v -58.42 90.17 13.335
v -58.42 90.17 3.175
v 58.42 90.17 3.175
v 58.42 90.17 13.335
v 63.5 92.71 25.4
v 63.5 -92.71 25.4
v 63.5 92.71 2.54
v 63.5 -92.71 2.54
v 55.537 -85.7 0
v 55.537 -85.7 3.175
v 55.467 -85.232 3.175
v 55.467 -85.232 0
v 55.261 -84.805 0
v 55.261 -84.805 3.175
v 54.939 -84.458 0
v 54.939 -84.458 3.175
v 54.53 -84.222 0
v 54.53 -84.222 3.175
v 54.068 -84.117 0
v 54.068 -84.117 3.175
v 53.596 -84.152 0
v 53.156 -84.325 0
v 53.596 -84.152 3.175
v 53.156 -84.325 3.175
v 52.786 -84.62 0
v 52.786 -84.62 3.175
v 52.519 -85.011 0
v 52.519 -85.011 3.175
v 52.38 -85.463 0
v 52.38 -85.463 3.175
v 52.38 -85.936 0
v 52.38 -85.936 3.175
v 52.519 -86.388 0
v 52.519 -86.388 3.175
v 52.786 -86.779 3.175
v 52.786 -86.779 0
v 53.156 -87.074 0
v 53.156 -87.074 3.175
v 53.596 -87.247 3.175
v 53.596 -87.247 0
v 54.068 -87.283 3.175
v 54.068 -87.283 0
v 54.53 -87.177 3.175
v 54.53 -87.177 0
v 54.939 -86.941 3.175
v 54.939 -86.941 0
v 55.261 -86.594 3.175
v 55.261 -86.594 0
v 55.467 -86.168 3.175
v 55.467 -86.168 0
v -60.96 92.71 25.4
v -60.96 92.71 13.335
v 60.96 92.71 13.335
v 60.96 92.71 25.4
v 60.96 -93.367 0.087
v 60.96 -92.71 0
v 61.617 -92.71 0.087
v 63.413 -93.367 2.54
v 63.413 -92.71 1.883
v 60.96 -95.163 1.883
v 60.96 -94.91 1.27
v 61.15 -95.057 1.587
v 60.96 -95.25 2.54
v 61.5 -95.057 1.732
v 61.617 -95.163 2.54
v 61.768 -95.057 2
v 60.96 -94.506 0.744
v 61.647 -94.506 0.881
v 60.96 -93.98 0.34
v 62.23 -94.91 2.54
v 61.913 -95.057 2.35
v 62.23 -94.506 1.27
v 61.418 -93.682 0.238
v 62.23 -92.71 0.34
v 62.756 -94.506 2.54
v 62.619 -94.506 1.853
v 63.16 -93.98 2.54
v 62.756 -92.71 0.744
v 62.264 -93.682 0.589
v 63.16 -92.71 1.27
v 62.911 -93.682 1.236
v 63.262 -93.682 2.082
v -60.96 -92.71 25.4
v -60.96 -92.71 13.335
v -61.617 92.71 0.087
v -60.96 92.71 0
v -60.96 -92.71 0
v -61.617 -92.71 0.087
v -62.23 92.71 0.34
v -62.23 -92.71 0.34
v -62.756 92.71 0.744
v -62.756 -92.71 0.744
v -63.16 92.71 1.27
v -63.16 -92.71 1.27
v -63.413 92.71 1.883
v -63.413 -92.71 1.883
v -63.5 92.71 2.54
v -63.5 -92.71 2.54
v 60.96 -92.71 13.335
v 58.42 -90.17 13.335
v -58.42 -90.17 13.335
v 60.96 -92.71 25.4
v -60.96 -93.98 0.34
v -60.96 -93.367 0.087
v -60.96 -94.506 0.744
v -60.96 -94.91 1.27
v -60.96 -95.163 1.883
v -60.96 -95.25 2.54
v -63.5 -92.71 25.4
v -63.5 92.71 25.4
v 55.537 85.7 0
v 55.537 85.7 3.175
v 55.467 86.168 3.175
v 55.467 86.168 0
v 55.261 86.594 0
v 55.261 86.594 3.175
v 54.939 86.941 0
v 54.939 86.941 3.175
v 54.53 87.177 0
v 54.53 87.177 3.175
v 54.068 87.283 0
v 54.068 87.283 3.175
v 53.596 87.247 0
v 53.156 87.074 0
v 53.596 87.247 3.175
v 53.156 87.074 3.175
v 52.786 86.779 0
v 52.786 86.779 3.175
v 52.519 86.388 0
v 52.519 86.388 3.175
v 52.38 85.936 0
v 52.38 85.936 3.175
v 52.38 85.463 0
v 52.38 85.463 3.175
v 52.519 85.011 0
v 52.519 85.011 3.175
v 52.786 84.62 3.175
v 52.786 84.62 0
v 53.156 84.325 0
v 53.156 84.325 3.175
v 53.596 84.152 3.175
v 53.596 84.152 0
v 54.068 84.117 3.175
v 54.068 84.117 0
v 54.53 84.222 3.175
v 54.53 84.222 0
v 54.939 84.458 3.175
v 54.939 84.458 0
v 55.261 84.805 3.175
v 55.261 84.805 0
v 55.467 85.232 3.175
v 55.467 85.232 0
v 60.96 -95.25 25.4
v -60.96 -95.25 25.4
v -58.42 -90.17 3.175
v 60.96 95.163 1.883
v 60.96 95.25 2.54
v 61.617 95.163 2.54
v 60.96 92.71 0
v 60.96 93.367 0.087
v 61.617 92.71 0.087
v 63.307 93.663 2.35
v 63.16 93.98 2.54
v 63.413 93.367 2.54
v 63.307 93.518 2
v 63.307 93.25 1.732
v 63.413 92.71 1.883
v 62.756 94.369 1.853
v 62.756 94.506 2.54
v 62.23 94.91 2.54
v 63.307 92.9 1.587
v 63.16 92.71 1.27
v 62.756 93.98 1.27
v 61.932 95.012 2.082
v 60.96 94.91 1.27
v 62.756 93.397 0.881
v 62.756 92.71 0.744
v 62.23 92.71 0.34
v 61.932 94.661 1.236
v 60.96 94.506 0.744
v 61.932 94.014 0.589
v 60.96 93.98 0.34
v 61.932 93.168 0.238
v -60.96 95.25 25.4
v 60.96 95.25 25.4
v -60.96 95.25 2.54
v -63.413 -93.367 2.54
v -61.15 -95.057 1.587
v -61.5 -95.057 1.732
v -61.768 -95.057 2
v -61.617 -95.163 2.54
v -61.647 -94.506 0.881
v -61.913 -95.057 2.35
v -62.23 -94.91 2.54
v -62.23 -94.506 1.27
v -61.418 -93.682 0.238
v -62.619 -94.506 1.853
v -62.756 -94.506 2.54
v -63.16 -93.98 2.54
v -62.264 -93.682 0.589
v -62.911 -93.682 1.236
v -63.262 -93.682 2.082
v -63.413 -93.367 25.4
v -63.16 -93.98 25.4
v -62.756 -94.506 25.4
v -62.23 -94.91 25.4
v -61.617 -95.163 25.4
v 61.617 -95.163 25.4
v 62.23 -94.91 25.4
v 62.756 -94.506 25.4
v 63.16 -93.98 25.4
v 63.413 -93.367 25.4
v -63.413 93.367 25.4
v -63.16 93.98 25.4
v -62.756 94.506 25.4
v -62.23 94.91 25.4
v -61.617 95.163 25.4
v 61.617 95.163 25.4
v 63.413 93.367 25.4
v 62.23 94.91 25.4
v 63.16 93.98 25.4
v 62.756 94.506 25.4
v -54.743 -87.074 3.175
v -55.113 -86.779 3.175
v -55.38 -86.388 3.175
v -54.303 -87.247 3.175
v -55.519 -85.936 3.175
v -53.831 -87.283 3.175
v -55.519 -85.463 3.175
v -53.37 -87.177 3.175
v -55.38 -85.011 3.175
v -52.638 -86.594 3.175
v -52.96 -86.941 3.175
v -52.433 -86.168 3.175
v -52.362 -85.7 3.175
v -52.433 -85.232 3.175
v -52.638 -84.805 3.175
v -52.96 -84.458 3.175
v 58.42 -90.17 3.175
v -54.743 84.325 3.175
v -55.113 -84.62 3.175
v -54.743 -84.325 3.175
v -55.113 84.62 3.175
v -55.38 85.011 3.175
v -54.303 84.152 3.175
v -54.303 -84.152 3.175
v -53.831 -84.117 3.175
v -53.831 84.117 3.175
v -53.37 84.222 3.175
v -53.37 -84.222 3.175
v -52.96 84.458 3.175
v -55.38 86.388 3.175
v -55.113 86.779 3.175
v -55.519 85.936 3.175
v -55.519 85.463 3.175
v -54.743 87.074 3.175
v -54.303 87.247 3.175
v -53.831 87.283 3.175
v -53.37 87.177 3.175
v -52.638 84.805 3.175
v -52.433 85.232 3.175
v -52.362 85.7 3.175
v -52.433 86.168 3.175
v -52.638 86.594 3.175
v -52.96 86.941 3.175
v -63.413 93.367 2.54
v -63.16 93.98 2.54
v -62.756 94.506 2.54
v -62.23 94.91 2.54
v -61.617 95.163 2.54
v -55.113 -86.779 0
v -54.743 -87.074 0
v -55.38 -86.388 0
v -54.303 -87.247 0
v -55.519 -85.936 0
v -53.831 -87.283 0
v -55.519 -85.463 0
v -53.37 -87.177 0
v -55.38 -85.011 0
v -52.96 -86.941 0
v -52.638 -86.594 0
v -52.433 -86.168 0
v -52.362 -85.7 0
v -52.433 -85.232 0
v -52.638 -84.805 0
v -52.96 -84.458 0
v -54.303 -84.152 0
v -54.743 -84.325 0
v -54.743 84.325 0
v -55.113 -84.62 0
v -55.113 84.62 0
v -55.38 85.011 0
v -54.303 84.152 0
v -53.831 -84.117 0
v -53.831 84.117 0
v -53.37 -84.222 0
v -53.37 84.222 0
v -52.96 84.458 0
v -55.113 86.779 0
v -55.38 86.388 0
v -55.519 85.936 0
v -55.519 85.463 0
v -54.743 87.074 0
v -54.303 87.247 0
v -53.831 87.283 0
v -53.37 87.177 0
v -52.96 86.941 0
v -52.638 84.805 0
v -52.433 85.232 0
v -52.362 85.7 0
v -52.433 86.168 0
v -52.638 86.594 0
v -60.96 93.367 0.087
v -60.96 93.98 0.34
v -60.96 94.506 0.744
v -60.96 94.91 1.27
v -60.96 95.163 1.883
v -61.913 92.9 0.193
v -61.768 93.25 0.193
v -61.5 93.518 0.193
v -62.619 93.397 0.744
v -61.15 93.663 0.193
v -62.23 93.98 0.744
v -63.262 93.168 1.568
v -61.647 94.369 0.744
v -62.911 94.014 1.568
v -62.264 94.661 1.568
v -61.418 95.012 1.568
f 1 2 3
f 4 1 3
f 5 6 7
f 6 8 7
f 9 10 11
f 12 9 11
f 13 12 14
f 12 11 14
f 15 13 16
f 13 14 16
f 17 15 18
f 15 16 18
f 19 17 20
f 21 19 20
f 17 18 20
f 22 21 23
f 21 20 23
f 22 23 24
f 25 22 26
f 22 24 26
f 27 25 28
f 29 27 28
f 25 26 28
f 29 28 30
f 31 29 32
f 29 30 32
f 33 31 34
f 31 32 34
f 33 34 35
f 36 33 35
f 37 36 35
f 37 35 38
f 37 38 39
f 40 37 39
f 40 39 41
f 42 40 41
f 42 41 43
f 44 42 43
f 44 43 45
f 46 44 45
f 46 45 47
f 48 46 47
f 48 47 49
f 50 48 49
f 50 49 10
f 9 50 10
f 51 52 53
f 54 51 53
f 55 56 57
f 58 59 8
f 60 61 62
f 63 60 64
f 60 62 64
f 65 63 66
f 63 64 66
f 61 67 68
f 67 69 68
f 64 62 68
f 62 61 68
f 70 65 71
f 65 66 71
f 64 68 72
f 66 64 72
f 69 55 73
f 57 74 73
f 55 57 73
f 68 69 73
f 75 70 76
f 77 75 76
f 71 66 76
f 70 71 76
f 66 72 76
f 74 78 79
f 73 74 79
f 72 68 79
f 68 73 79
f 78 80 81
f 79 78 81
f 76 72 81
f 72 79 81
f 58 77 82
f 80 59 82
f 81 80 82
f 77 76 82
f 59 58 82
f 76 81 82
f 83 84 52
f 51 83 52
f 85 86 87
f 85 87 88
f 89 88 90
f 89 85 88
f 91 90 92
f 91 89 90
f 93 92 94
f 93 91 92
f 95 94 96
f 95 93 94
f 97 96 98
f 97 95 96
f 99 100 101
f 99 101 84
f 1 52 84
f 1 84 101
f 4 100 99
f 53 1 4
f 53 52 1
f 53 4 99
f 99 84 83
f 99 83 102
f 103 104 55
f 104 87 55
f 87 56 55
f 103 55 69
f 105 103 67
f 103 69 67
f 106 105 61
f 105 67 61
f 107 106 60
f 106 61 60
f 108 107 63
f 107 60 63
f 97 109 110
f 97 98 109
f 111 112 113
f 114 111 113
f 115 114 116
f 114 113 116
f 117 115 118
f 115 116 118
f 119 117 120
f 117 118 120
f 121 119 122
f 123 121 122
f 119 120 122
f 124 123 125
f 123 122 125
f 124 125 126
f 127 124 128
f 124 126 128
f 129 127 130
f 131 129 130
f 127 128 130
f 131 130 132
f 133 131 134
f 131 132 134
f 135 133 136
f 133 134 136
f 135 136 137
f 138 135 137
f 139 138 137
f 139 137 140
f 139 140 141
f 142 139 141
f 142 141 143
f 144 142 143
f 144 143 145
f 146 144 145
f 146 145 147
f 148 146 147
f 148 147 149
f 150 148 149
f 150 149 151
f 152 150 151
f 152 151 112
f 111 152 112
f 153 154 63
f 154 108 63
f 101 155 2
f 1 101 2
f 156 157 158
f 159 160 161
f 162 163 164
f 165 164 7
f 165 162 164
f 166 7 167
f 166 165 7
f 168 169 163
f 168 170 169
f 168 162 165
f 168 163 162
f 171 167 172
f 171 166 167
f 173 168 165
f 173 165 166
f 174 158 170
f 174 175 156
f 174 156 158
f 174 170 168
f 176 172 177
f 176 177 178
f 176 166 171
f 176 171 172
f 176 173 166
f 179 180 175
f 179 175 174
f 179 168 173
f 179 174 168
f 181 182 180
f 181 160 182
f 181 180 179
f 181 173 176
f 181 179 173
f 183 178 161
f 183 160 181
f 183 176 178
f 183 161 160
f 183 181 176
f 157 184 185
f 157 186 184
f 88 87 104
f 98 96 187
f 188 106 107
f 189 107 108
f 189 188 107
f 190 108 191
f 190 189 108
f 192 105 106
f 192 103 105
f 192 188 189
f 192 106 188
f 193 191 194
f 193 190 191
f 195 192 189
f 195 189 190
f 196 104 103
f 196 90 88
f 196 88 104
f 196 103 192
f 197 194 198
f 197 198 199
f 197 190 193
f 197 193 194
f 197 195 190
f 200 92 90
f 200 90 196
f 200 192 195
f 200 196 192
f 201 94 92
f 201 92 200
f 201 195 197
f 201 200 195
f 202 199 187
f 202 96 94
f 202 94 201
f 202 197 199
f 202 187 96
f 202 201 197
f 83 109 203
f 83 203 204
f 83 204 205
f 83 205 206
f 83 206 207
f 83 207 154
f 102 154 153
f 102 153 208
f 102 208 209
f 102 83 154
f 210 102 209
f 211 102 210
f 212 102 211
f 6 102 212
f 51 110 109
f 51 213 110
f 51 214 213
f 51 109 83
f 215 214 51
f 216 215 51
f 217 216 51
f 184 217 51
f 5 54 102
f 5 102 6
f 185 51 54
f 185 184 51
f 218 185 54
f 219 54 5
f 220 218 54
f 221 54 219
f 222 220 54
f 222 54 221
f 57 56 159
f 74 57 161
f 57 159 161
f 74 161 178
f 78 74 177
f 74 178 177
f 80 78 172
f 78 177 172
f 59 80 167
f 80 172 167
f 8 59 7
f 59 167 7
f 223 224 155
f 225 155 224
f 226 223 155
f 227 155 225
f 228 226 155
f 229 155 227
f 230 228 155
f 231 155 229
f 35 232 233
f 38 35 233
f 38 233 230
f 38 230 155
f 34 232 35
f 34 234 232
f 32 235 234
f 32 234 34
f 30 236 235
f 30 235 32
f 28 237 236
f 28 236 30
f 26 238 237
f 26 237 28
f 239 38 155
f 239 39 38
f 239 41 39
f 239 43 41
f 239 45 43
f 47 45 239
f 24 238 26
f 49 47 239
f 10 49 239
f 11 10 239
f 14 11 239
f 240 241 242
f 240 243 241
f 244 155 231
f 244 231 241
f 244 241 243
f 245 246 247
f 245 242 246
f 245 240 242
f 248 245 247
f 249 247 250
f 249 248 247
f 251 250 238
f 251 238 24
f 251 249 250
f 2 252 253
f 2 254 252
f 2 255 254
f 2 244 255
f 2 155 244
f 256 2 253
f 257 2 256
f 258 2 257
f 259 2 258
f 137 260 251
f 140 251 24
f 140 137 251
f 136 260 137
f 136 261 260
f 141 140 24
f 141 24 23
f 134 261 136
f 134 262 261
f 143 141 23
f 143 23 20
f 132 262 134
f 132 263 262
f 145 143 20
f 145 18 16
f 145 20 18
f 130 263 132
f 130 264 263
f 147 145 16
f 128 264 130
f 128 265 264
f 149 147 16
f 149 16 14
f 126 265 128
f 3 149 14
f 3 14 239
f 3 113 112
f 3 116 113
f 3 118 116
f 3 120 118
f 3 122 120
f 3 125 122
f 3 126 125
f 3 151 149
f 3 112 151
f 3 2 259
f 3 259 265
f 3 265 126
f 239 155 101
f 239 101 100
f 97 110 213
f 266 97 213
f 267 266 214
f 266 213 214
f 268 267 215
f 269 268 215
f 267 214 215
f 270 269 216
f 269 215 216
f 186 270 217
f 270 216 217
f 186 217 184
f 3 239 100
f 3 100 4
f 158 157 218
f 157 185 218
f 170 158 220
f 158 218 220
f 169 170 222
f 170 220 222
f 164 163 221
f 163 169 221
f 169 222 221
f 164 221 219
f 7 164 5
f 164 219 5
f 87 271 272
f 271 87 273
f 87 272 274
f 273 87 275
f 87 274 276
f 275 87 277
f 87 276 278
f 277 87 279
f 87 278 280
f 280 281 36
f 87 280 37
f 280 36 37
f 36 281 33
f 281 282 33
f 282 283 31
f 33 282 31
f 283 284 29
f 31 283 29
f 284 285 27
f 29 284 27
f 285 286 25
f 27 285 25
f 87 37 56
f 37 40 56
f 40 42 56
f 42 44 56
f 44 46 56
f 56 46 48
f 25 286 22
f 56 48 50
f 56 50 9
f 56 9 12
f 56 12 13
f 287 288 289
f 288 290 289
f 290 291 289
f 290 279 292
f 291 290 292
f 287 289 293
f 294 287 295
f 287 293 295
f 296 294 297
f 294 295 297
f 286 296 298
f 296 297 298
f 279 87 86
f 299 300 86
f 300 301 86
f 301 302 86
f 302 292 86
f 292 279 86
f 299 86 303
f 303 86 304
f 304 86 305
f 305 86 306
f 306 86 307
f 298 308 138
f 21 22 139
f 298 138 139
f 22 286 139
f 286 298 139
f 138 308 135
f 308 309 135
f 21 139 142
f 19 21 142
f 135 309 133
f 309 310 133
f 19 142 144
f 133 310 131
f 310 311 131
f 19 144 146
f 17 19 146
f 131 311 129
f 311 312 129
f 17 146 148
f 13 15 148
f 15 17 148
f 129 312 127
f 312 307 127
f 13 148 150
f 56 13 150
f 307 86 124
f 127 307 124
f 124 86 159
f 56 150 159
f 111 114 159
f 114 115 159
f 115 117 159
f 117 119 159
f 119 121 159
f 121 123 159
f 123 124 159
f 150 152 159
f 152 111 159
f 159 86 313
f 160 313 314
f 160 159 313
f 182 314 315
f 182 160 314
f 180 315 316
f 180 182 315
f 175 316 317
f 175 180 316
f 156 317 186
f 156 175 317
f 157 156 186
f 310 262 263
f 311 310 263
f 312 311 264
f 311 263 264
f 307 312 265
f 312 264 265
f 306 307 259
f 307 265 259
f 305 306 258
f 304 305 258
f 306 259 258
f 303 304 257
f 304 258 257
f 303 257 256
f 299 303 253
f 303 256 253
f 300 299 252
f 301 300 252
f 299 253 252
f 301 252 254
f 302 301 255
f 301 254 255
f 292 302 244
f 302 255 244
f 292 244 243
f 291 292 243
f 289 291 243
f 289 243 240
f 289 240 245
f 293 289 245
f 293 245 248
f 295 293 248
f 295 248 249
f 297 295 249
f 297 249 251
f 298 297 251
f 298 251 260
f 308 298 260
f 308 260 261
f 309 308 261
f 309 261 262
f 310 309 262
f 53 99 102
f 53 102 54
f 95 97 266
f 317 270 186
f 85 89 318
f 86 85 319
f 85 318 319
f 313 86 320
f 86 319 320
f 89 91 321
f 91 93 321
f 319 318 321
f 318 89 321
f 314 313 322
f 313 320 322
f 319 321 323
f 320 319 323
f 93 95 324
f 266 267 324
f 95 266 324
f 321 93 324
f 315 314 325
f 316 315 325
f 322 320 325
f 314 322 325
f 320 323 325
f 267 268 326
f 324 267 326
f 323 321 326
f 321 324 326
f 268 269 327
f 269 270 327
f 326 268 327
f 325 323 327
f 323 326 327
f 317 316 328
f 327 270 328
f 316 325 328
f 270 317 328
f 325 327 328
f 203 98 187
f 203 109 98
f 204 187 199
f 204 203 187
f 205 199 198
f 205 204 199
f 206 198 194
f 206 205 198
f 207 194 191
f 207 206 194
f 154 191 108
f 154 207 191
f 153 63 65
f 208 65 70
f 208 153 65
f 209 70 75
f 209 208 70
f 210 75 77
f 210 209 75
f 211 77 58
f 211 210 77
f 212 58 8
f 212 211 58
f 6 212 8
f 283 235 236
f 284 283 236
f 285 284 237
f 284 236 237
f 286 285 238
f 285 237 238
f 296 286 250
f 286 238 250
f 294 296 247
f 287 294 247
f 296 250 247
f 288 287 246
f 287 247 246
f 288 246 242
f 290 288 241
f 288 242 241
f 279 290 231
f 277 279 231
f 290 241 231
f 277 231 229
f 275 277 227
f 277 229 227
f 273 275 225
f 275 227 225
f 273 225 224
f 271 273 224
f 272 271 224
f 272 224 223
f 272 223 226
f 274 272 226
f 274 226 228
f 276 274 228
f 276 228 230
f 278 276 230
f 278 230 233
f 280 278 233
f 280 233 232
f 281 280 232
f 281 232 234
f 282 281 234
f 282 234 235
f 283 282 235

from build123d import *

# Parameters (mm, degrees)
F0_W     = 127
F0_H     = 190.5
F0_W_2   = 121.92
F0_H_2   = 185.42
F1_DEPTH = 25.4
F2_W     = 121.92
F2_H     = 3.175
F3_DEPTH = 185.42
F4_W     = 121.92
F4_H     = 185.42
F4_W_2   = 116.84
F4_H_2   = 180.34
F5_DEPTH = 10.16
F6_R     = 1.5875
F7_DEPTH = 25.4
F8_R     = 2.54


with BuildPart() as f1:
    # F0 (on Top) → F1 (new body)
    with BuildSketch(Plane.XY):
        Rectangle(F0_W, F0_H)
        Rectangle(F0_W_2, F0_H_2, mode=Mode.SUBTRACT)
    extrude(amount=F1_DEPTH)

    # F2 (on face) → F3 (join)
    with BuildSketch(Plane.XZ.offset(-92.71)):
        with Locations((0, 1.5875)):
            Rectangle(F2_W, F2_H)
    extrude(amount=F3_DEPTH)

    # F4 (on face) → F5 (join)
    with BuildSketch(Plane.XY.offset(3.175)):
        Rectangle(F4_W, F4_H)
        Rectangle(F4_W_2, F4_H_2, mode=Mode.SUBTRACT)
    extrude(amount=F5_DEPTH)

    # F6 (on face) → F7 (cut)
    with BuildSketch(Plane.XY.offset(3.175)):
        with Locations((-53.9496, 85.6996)):
            Circle(F6_R)
        with Locations((53.9496, 85.6996)):
            Circle(F6_R)
        with Locations((-53.9496, -85.6996)):
            Circle(F6_R)
        with Locations((53.9496, -85.6996)):
            Circle(F6_R)
    extrude(amount=-F7_DEPTH, mode=Mode.SUBTRACT)

    # F8
    f8_edges = [f1.edges().sort_by_distance(p)[0] for p in [
        (-63.5, 95.25, 12.7),
        (-63.5, 0, 0),
        (0, 95.25, 0),
        (63.5, 95.25, 12.7),
        (63.5, 0, 0),
        (0, -95.25, 0),
        (63.5, -95.25, 12.7),
        (-63.5, -95.25, 12.7),
    ]]
    fillet(f8_edges, radius=F8_R)


solid = f1.part
